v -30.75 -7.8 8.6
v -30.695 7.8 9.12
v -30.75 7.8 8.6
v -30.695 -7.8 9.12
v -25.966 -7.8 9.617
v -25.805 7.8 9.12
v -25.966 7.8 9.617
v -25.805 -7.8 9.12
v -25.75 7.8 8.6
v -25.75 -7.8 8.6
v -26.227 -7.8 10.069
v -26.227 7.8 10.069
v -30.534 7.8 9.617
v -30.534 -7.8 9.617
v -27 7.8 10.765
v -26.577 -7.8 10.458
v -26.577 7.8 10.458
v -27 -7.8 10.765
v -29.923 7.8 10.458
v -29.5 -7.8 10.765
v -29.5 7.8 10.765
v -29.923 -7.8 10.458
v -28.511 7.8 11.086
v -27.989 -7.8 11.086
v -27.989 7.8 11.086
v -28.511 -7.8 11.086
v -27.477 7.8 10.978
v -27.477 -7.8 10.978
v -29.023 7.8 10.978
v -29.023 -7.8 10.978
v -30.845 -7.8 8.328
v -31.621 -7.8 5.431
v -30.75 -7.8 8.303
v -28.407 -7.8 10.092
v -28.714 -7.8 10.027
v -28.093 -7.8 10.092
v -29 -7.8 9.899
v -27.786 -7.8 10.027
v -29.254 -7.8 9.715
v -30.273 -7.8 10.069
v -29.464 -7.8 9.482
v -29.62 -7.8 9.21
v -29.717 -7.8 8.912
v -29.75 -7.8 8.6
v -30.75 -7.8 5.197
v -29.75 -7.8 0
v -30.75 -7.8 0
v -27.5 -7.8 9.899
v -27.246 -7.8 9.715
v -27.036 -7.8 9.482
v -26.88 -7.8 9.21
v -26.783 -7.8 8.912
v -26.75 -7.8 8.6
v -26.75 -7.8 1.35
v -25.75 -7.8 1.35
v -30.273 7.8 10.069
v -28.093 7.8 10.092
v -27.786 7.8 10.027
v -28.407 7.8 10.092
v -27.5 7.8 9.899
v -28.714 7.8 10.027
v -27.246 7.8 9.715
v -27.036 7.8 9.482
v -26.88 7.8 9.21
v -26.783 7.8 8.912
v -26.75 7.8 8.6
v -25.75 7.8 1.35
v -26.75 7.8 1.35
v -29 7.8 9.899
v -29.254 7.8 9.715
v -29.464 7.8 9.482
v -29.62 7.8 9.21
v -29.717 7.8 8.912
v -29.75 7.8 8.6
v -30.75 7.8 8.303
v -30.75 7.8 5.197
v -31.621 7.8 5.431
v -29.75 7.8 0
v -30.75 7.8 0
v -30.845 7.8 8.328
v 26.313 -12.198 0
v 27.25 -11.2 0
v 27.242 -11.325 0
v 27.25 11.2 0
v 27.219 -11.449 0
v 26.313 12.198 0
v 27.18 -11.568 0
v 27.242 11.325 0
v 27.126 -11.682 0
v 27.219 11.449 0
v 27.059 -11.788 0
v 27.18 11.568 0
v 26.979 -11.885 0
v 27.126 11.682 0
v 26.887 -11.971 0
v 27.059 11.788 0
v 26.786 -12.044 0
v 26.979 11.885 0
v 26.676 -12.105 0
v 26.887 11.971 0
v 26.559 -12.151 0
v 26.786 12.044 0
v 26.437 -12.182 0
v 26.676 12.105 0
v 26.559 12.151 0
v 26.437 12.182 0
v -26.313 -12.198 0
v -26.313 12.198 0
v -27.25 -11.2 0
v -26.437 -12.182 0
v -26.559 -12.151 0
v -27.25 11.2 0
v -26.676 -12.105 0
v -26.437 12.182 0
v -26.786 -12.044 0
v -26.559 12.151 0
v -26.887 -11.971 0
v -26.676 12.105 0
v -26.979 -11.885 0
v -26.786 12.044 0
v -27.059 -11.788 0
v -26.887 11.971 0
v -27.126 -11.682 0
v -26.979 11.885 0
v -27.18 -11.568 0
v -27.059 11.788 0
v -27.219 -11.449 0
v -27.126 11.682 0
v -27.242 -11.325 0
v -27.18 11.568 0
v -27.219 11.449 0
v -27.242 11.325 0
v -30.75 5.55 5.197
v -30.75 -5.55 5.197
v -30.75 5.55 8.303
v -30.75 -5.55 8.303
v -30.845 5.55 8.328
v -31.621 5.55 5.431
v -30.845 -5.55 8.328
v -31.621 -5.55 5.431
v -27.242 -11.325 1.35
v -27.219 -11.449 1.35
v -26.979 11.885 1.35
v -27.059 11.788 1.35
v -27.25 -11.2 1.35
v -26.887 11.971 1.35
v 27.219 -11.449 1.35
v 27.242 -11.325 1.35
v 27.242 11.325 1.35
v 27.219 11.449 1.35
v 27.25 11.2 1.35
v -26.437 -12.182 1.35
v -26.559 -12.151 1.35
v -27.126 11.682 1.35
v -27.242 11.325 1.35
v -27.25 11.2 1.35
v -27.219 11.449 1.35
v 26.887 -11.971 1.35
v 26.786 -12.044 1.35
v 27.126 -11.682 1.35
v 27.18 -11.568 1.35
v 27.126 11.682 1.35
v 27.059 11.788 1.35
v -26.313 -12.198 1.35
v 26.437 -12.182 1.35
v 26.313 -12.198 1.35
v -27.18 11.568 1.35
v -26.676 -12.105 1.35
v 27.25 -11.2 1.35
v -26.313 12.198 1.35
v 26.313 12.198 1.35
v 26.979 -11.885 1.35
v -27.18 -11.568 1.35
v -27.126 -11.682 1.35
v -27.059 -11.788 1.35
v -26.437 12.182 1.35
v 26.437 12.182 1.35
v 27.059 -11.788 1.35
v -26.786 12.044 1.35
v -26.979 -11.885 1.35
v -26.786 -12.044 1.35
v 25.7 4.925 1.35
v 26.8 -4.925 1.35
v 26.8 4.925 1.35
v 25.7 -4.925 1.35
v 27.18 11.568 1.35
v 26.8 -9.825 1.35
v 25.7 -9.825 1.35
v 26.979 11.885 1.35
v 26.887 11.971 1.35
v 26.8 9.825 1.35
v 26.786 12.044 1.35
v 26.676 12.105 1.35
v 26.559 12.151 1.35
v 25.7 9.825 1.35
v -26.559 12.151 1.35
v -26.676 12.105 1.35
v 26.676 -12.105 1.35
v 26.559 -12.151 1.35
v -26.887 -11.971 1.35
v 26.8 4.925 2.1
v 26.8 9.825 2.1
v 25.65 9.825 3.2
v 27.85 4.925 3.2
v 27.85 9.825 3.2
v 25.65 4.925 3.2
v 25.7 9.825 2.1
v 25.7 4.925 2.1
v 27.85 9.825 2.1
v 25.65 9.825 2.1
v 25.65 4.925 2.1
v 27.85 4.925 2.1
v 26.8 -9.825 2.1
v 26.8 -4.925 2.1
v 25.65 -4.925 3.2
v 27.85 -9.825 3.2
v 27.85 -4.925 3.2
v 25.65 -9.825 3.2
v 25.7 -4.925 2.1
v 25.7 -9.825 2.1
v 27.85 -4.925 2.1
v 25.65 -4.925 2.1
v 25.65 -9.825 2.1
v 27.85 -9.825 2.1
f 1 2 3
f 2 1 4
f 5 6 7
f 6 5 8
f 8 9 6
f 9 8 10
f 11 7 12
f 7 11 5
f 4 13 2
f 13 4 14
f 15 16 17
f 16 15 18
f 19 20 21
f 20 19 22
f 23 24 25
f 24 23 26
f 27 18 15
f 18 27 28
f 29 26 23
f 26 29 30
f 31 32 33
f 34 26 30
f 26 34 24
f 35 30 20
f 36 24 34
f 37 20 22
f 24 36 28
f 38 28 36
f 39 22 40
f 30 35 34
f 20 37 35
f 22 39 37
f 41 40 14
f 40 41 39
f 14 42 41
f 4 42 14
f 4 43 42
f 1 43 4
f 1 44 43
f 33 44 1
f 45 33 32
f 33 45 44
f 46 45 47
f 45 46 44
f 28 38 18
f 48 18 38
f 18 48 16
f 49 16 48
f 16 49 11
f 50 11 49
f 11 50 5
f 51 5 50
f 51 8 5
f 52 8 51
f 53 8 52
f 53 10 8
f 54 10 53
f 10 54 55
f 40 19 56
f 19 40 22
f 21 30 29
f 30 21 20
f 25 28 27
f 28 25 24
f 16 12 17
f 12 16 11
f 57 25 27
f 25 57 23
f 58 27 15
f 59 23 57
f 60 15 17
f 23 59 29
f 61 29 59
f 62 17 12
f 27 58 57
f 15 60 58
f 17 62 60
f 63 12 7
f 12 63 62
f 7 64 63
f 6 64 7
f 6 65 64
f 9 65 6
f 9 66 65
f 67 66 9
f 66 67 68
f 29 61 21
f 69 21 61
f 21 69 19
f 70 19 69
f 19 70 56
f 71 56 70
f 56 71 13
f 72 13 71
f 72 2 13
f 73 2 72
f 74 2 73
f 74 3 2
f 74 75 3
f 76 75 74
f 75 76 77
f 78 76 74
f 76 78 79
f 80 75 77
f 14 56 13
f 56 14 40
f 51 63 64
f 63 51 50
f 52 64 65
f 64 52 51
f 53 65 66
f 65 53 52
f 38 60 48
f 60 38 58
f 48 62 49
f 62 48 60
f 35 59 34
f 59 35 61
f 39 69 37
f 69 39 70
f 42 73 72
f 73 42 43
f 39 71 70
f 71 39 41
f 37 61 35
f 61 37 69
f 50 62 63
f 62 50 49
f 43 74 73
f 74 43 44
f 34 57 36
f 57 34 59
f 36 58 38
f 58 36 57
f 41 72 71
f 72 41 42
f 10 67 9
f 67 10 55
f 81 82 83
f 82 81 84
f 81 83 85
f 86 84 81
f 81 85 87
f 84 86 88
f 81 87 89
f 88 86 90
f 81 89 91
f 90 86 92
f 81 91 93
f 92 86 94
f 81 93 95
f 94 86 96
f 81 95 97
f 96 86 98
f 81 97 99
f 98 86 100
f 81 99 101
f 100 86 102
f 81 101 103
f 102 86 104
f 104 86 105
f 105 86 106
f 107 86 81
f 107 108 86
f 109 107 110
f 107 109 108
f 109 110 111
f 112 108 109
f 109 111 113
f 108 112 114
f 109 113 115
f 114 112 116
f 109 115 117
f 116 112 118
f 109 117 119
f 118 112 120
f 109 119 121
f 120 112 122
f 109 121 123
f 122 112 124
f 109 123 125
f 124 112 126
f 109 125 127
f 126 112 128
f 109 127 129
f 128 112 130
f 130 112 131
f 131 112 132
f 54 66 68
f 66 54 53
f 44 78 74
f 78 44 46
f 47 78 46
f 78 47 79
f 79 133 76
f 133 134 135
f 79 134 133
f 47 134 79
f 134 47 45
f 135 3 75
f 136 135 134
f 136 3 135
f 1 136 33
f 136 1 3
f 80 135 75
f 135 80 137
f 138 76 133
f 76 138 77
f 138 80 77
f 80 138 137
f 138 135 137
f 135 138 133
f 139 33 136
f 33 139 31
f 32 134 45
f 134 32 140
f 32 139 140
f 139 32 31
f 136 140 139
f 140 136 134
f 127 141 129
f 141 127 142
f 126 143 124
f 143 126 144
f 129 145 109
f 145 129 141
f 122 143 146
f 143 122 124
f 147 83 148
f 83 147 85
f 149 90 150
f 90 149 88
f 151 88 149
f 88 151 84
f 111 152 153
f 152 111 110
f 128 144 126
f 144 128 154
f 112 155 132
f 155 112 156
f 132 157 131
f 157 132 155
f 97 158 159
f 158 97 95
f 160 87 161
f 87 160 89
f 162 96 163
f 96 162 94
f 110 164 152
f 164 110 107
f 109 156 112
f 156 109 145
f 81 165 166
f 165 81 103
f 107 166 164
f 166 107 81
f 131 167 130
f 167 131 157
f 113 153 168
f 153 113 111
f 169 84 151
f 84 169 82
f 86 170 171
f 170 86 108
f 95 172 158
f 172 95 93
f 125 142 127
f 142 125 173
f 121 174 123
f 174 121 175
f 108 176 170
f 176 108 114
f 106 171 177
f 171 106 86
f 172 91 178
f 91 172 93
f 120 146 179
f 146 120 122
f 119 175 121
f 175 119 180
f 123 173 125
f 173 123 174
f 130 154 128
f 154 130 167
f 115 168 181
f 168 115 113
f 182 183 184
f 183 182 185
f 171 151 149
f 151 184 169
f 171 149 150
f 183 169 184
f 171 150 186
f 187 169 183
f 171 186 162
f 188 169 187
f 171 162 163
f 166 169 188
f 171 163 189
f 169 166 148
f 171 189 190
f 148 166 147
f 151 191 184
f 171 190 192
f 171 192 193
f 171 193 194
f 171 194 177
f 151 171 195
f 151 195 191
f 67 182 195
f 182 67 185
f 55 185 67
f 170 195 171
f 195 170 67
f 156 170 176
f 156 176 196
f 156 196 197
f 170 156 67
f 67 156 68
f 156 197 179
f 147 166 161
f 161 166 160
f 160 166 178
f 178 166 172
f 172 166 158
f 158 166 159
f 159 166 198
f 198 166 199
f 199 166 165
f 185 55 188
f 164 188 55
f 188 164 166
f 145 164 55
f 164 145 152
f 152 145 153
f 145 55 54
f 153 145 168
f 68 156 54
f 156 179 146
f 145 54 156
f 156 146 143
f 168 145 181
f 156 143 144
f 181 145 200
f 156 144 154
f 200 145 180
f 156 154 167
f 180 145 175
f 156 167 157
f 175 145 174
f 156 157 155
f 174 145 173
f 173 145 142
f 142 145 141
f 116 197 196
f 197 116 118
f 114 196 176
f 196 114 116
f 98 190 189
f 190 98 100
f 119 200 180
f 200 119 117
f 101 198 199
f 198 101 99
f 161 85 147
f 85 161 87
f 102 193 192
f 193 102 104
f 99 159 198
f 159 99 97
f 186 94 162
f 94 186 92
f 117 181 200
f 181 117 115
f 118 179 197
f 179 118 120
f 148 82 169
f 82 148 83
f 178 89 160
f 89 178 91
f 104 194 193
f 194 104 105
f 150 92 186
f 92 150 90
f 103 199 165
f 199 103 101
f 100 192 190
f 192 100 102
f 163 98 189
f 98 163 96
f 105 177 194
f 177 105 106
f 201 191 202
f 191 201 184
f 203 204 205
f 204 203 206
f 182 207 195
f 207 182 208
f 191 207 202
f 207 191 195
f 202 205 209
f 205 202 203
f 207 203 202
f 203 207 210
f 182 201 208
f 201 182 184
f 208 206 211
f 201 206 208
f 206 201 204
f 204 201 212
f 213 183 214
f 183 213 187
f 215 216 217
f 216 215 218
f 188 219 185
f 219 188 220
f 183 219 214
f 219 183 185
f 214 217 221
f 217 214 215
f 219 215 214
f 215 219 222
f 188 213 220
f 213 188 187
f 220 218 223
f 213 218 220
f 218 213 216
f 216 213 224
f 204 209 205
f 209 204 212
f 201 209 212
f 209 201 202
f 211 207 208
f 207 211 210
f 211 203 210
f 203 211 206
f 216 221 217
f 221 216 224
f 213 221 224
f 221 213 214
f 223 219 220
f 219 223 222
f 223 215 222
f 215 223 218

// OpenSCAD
module roundedRect(size, radius)
{
	x = size[0];
	y = size[1];
	z = size[2];

	linear_extrude(height=z)
	hull()
	{
		// place 4 circles in the corners, with the given radius
		translate([(-x/2)+(radius/2), (-y/2)+(radius/2), 0])
		circle(r=radius);
	
		translate([(x/2)-(radius/2), (-y/2)+(radius/2), 0])
		circle(r=radius);
	
		translate([(-x/2)+(radius/2), (y/2)-(radius/2), 0])
		circle(r=radius);
	
		translate([(x/2)-(radius/2), (y/2)-(radius/2), 0])
		circle(r=radius);
	}
}

module mx1000_bat_cov()
{

//dimensions
L1 = 53.5;//length of main body
L2 = 23.4;//width of main body (flat section only)
L3 = 9;//width of main body (angled section only)
L4 = 14.75;//center-to-center
L5 = 4-1.35;//height of end clips
L6 = 2.2;//Length of end clips
L7 = 4.9;//width of end clips
L8 = 15.6;//width of retension clip
L9 = 11.1;//height of retension clip
L10 = 5.25;// offset for catch
L11 = 3;// length of catch
T1 = 1.35;//thickness of main body
T2 = 1.1;//thickness of end clips
T3 = 1; //thickness of retension clip
T4 = 2.25; //thickness of catch
D1 = 5; //outer diamater of retension clip
D2 = D1 - 2*T3;//inner diamater of retension clip
A1 = 5.5; //angle of main (angled) body (trimming)
//Calculate the offset from rotation using (a^2 + b^2 = c^2)
CL1 = sqrt(((L3/2)*(L3/2))/2);
//add half the length of the main section
CL2 = CL1 + L2/2;
//Now move based on the material thickness using (a^2 + b^2 = c^2)
CL3 = CL2 - sqrt(((T1/2)*(T1/2))/2);

			union() 
			{
				//the main body
				//cube([L1, L2, T1], center = true);
                roundedRect([L1, L2, T1], 1, $fn=50);
                
				//The angled sections (#1)
				//translate([0,CL3,(L3/2)-.75*T1])
				//rotate([45,0,0])
				//difference () //difference
				//{
				//	cube([L1, L3, T1], center = true);

				//	translate([(((L1*1.1)/2)-L3*sin(A1)),L3/2,0])
				//	rotate([0,0,A1])
				//	cube([L1*.1, L3*2, T1], center = true);
				//	translate([-(((L1*1.1)/2)-L3*sin(A1)),L3/2,0])
				//	rotate([0,0,-A1])
				//	cube([L1*.1, L3*2, T1], center = true);
				//}
				//The angled sections (#2)
				//translate([0,-CL3,(L3/2)-.75*T1])
				//rotate([-45,0,0])
				//difference () //difference
				//{
				//	cube([L1, L3, T1], center = true);

				//	translate([-(((L1*1.1)/2)-L3*sin(A1)),-L3/2,0])
				//	rotate([0,0,A1])
				//	cube([L1*.1, L3*2, T1], center = true);
				//	translate([(((L1*1.1)/2)-L3*sin(A1)),-L3/2,0])
				//	rotate([0,0,-A1])
				//	cube([L1*.1, L3*2, T1], center = true);
				//}
				// the end clips
				translate([(L1/2)-.5,L4/2,(L5+T2)/2])
				cube([T2, L7, L5], center = true);
				translate([(L1/2)-.5,-L4/2,(L5+T2)/2])
				cube([T2, L7, L5], center = true);
				// the end clip extensions
				translate([L1/2,L4/2,L5])
				cube([L6, L7, T2], center = true);
				translate([L1/2,-L4/2,L5])
				cube([L6, L7, T2], center = true);
			

			translate([-((L1/2)+(D2/2)),0,0]) {
			difference () //difference
				{
				//The outer cylinder (OD)
				translate([0,0,L9-(D1/2)])
				rotate([90,0,0])
				scale([1/100,1/100,1/100])
				cylinder(100*L8, 100*(D1/2), 100*(D1/2), center = true);
				//The inner cylinder (ID)
				translate([0,0,L9-(D1/2)])
				rotate([90,0,0])
				scale([1/100,1/100,1/100])
				cylinder(100*L8, 100*(D2/2), 100*(D2/2), center = true);
				translate([0,0,L9-(D1/2)-((D1/2)/2)])
				cube([D1, L8+.1, D1/2], center = true);
				}//difference

				translate([((D1/2)-(T3/2)),0,(L9/2)-D1/4])
				cube([T3, L8, L9-(D1/2)], center = true);
				translate([-((D1/2)-(T3/2)),0,(L9/2)-D1/4])
				cube([T3, L8, L9-(D1/2)], center = true);	
				//The retension catches
				translate([-D1/2,((L8/2)-(T4/2)),L10+L11/2])
				rotate([0,15,0])
				cube([T3,T4,L11]	, center = true);	
				translate([-D1/2,-((L8/2)-(T4/2)),L10+L11/2])
				rotate([0,15,0])
				cube([T3,T4,L11]	, center = true);	
			}//Translate
		}//union
}

 mx1000_bat_cov();
